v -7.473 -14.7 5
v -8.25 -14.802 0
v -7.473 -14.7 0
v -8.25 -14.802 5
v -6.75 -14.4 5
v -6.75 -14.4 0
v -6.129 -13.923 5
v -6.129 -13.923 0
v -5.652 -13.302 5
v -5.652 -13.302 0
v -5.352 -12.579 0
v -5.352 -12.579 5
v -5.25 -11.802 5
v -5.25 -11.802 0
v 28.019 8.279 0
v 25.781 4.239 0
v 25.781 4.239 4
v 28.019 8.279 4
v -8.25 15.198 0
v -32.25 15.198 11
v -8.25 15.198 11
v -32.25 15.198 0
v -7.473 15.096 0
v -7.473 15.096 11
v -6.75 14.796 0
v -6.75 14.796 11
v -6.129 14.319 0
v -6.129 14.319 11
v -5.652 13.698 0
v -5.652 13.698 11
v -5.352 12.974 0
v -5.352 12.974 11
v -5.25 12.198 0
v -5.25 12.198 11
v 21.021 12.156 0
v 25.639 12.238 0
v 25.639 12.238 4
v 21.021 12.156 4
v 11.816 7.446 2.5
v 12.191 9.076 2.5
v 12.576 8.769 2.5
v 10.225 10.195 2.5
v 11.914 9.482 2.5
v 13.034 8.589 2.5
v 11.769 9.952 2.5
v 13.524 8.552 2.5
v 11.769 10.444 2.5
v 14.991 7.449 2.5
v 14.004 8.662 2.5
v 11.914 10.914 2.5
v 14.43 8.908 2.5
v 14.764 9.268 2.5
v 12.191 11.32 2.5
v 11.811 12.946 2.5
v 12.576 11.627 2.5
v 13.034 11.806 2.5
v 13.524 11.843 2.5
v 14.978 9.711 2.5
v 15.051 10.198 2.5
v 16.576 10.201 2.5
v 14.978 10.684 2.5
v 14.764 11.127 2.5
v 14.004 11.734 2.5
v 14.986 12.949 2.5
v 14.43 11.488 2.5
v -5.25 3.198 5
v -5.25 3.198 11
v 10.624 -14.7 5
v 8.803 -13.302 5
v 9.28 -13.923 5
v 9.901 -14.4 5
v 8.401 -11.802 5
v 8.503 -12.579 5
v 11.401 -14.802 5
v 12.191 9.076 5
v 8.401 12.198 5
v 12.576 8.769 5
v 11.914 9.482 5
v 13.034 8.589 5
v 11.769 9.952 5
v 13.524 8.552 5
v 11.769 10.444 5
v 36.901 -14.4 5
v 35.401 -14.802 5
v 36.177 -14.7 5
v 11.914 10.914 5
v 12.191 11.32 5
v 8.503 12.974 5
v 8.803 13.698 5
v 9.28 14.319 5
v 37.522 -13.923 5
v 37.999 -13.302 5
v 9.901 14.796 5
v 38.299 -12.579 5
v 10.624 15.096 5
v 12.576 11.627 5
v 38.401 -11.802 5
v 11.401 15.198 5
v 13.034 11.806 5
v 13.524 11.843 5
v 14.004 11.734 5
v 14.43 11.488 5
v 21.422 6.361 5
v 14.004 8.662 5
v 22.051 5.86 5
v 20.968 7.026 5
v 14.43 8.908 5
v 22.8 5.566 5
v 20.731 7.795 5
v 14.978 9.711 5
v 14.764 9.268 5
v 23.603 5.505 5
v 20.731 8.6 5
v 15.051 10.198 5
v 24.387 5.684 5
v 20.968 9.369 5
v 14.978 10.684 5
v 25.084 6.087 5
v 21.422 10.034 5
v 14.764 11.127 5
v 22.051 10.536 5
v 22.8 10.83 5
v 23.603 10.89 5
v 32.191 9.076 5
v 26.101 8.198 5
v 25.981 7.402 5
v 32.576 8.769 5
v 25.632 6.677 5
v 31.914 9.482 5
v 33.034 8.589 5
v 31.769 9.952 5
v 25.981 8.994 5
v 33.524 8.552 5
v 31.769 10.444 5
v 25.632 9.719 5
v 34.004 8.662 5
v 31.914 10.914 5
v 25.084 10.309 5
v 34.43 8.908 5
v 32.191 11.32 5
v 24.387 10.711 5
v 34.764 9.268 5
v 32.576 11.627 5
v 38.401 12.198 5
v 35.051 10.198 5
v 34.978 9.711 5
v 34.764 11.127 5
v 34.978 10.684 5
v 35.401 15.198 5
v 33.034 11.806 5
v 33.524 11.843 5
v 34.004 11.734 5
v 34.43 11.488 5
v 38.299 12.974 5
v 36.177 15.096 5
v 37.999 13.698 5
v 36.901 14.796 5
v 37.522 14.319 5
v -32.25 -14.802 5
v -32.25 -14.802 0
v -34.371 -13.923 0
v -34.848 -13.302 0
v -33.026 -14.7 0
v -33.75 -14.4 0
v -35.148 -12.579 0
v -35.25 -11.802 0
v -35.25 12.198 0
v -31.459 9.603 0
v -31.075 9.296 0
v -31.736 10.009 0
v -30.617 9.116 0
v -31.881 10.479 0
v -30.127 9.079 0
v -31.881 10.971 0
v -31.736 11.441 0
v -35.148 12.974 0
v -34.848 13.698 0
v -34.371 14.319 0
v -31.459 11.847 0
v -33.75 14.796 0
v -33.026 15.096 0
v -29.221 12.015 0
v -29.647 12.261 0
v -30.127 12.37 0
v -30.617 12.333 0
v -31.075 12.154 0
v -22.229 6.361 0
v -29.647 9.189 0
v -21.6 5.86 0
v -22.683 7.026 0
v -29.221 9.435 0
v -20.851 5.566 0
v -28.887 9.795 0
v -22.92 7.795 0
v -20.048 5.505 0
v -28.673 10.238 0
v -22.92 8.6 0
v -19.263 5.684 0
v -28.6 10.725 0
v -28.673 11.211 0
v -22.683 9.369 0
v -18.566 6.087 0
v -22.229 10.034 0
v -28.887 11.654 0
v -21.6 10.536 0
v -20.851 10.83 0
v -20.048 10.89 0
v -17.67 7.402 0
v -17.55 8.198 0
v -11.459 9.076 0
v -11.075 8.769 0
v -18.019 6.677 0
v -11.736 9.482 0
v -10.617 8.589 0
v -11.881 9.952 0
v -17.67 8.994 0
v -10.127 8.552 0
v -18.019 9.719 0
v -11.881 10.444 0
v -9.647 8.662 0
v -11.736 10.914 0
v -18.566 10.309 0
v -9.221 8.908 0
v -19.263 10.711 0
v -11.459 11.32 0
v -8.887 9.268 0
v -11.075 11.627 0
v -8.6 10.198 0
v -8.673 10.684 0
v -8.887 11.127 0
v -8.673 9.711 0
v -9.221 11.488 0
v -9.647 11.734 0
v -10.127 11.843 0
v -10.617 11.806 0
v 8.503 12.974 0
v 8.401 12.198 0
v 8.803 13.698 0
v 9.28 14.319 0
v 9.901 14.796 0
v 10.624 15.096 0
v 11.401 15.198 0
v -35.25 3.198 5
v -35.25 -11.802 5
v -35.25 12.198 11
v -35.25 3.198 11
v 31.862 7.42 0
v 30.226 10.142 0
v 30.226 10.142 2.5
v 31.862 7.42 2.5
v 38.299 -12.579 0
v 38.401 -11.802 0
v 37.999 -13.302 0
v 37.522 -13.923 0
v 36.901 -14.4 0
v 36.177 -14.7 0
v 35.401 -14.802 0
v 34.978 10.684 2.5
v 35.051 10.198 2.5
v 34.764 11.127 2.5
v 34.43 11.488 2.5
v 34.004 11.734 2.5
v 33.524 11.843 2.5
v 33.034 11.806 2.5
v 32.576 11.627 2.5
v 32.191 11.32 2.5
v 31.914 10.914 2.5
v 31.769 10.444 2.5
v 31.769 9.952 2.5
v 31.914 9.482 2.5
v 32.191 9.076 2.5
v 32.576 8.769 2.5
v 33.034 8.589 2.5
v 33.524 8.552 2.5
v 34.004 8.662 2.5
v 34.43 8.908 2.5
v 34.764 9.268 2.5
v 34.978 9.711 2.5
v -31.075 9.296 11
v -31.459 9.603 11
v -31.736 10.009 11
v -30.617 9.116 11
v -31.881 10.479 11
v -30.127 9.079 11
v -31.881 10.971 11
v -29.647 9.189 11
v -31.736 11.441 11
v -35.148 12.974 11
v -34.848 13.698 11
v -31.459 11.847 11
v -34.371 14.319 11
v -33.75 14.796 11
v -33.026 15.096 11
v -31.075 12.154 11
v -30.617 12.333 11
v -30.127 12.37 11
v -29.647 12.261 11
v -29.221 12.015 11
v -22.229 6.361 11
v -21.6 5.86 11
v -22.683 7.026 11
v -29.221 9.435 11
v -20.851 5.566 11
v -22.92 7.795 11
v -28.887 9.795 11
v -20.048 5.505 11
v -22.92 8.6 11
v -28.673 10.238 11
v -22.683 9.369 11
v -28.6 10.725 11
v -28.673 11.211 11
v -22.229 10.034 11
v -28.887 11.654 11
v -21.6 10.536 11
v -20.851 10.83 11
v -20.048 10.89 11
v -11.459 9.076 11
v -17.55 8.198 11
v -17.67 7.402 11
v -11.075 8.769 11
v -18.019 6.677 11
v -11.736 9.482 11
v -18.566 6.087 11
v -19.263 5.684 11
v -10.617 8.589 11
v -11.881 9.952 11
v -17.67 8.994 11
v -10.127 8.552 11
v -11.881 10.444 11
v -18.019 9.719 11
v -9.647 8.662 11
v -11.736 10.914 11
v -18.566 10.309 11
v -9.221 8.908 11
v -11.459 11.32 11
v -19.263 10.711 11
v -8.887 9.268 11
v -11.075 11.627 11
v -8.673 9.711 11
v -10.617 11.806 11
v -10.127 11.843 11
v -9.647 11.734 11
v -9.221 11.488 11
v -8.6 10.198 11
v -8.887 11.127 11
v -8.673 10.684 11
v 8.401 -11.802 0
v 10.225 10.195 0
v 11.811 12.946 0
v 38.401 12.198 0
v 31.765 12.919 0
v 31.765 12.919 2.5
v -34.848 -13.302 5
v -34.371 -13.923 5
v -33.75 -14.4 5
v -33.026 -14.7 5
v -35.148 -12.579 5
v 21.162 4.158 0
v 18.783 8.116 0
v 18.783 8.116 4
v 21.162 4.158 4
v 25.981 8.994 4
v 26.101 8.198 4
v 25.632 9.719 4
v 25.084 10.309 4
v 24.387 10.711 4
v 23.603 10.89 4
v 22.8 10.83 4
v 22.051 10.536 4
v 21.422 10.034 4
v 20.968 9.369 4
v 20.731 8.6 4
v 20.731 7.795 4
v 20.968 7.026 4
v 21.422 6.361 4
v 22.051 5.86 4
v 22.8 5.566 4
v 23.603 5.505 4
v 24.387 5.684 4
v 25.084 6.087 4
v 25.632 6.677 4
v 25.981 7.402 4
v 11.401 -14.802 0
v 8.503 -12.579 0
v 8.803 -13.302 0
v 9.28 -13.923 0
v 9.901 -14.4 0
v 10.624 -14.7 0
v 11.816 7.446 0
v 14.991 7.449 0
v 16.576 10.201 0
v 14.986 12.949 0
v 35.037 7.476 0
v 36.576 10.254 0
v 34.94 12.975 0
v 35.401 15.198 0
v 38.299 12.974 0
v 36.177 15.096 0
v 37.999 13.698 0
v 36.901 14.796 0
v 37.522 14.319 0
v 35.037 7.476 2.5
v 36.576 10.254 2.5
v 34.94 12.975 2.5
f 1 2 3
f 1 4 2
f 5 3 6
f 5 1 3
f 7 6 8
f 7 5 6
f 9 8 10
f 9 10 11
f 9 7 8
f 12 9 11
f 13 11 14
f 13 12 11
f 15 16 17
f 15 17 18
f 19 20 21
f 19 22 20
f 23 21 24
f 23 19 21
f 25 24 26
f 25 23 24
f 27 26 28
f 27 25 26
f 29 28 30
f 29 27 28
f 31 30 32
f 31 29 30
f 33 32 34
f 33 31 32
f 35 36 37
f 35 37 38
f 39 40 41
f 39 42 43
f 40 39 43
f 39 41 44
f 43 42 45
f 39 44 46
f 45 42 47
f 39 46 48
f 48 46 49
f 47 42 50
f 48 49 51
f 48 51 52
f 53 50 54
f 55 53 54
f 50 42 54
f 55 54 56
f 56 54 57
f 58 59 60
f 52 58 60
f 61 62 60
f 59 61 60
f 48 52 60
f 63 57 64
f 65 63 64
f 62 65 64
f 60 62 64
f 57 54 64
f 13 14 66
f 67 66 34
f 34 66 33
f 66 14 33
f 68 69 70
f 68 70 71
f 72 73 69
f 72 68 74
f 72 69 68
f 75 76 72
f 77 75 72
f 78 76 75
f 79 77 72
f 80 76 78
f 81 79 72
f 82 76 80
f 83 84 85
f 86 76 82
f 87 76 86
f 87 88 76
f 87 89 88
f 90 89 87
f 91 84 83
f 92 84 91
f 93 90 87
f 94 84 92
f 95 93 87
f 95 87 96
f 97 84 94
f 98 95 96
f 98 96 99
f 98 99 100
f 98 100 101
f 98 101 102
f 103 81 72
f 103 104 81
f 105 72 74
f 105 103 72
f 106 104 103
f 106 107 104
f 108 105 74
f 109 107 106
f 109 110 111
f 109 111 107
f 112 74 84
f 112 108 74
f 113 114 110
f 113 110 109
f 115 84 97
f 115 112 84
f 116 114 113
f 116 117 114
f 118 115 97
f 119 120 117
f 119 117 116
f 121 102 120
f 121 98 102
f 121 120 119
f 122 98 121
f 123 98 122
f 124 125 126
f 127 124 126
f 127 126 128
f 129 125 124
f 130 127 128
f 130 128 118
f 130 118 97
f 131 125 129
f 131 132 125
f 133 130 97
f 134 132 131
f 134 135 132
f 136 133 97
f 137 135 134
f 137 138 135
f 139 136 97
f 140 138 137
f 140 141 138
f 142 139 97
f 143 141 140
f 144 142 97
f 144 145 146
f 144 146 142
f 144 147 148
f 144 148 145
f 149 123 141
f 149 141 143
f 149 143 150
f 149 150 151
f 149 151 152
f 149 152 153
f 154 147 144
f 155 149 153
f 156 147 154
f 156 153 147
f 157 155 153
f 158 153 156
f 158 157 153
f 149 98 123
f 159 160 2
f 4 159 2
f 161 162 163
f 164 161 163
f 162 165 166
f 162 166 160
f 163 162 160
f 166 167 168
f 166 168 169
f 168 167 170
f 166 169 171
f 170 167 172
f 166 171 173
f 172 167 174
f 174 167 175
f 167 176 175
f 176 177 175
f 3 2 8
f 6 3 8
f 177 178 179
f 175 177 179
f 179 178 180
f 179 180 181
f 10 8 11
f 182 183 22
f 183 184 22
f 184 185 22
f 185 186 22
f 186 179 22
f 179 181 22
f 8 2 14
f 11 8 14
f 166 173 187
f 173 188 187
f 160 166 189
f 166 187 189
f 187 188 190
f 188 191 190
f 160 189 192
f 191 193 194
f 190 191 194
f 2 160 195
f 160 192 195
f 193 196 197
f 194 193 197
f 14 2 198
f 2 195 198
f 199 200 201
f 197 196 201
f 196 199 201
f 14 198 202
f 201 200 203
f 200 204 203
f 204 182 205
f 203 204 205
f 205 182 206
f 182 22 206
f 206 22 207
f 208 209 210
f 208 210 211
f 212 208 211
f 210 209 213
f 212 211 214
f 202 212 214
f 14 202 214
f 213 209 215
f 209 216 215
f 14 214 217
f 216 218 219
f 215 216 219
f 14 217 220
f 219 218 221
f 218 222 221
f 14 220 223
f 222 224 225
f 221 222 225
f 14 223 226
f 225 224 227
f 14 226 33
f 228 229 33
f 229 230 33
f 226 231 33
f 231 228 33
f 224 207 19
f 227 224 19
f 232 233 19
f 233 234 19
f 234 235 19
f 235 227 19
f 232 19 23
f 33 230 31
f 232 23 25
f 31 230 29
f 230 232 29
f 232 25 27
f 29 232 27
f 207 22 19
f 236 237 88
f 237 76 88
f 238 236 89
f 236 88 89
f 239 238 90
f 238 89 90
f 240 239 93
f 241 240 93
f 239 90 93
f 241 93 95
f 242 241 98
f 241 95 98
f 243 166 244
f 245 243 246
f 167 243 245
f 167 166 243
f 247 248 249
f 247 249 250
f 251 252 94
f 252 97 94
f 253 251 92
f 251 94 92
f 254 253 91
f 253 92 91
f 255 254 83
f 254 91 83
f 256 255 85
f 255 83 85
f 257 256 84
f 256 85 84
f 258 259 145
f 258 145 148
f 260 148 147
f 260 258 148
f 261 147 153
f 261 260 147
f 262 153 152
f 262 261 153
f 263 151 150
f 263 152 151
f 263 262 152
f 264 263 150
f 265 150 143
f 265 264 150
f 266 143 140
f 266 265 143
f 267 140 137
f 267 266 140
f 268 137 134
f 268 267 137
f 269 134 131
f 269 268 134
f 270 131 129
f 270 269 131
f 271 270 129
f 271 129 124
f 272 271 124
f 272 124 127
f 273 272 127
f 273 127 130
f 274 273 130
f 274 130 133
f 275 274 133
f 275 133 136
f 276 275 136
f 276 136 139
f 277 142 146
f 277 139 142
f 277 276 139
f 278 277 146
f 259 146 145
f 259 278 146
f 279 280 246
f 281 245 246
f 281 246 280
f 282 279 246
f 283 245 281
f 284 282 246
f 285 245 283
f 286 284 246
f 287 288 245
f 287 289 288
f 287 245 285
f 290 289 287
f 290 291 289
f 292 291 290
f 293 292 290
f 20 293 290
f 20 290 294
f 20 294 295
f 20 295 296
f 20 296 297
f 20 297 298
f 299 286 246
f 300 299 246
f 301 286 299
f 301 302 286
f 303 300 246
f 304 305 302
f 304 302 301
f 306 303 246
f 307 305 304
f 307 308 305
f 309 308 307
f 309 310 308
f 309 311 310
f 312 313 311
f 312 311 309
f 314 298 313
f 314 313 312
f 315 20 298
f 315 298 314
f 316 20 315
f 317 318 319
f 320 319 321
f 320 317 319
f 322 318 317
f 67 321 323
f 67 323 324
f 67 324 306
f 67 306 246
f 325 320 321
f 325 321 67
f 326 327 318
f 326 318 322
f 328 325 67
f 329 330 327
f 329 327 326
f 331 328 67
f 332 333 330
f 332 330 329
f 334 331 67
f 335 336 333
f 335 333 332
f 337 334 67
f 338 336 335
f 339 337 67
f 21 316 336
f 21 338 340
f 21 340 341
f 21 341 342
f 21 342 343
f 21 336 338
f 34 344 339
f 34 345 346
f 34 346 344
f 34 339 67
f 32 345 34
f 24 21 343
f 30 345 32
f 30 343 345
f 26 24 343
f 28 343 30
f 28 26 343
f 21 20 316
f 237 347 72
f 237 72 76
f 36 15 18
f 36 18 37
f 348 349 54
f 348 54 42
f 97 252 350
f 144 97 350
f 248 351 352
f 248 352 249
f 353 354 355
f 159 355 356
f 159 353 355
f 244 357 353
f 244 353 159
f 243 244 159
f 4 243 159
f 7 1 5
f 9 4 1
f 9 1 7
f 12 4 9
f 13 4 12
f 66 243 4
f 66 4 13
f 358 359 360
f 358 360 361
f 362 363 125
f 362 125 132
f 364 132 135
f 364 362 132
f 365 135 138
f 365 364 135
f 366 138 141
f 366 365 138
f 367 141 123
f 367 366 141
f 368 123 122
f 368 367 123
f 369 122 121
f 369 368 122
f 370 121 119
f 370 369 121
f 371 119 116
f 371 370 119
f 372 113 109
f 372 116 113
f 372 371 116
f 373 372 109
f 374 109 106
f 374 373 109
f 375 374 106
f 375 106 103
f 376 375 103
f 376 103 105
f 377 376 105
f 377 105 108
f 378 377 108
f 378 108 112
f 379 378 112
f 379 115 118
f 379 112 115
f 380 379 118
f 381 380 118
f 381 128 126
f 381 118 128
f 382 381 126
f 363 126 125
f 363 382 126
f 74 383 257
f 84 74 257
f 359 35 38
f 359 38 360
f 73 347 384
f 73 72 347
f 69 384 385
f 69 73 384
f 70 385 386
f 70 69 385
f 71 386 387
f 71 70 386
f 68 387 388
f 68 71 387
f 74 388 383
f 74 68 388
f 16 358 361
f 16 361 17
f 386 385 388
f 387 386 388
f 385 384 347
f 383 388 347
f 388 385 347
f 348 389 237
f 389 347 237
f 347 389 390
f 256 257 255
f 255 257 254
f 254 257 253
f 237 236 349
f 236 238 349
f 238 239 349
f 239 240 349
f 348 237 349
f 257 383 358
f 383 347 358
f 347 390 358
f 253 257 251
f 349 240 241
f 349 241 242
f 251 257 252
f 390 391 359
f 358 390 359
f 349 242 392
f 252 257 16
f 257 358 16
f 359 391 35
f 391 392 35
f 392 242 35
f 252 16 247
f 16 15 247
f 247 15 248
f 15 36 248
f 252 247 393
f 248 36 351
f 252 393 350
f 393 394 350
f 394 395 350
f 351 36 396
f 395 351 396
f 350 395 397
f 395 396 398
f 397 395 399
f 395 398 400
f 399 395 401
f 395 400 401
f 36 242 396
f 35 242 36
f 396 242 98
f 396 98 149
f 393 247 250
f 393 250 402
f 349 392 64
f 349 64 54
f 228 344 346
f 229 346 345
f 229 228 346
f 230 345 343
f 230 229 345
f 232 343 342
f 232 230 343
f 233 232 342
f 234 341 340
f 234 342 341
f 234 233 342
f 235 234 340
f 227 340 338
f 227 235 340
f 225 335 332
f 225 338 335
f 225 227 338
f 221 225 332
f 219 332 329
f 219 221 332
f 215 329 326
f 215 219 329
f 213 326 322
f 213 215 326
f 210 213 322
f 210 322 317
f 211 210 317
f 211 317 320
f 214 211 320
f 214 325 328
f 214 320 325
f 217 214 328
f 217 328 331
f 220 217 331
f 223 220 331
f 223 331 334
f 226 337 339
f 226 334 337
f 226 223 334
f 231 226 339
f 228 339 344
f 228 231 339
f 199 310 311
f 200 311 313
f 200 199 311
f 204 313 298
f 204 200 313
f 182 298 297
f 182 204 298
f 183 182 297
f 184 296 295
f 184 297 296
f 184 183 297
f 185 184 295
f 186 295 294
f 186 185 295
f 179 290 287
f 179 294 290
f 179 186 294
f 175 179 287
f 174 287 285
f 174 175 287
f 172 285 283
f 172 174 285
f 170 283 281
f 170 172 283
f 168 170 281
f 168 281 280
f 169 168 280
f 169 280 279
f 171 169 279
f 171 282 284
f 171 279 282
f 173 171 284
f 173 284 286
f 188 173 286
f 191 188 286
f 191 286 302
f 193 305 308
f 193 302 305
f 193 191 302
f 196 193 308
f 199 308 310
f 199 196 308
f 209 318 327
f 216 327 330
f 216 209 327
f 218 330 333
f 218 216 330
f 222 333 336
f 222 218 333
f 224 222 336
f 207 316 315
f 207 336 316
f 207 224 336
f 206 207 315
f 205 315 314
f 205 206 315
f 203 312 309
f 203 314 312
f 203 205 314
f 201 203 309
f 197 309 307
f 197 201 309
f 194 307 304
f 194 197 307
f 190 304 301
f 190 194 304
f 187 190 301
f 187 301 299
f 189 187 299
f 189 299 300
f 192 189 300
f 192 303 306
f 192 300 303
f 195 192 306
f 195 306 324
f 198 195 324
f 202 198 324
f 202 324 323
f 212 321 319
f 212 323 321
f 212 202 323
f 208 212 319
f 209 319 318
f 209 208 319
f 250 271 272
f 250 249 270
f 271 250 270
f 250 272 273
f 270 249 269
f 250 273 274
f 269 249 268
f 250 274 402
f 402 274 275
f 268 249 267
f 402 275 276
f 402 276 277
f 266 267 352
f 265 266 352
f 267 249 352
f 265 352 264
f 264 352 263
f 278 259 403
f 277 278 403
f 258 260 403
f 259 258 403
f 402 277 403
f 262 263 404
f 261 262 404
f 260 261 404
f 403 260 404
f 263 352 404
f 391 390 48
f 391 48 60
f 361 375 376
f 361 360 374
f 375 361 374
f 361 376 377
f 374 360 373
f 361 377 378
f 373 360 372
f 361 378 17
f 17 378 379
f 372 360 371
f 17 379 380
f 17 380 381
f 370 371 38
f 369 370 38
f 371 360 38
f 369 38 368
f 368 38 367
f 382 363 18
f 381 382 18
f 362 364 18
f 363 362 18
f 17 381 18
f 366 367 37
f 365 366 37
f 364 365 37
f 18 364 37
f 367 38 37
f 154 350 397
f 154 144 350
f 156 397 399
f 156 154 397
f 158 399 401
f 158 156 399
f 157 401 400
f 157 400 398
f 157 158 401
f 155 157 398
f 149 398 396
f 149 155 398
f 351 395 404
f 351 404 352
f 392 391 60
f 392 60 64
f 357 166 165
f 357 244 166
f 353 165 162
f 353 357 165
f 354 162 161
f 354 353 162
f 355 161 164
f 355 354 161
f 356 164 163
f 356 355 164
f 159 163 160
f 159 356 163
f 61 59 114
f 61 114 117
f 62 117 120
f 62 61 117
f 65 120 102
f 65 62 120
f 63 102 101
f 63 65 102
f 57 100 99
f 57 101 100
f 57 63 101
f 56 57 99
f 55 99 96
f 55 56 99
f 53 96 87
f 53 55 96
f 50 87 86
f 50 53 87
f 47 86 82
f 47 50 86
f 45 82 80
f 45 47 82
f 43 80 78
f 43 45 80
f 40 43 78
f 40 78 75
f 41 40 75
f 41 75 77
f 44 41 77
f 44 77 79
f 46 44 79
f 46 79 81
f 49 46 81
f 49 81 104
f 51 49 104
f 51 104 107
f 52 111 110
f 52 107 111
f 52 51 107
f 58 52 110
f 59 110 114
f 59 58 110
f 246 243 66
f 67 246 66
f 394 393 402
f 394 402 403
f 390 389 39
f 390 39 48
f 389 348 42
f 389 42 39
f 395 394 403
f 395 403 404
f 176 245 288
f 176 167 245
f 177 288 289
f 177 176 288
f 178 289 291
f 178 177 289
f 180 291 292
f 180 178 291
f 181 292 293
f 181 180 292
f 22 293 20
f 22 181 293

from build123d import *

# Parameters (mm, degrees)
F0_W     = 30
F0_H     = 30
F1_DEPTH = 5
F2_W     = 30
F2_H     = 12
F3_DEPTH = 6
F4_R     = 1.65
F4_R_2   = 2.7
F5_DEPTH = 11.001
F7_DEPTH = 2.5
F8_DEPTH = 1.5
F9_R     = 3
F9_2_R   = 3


with BuildPart() as f1:
    # F0 (on Top) → F1 (new body)
    with BuildSketch(Plane.XY):
        with Locations((-20.2498977029, 0.1978335731)):
            Rectangle(F0_W, F0_H)
    extrude(amount=F1_DEPTH)

    # F2 (on face) → F3 (join)
    with BuildSketch(Plane.XY.offset(5)):
        with Locations((-20.2498977029, 9.1978335731)):
            Rectangle(F2_W, F2_H)
    extrude(amount=F3_DEPTH)


with BuildPart() as f1b:
    # F0 (on Top) → F1, piece 2 (new body)
    with BuildSketch(Plane.XY):
        with Locations((23.4008972489, 0.1978335731)):
            Rectangle(F0_W, F0_H)
    extrude(amount=F1_DEPTH)


with BuildPart() as f5_tool:
    # F4 (on Top) → F5 (new body, through all)
    with BuildSketch(Plane.XY):
        with Locations((33.4008972489, 10.1978335731)):
            Circle(F4_R)
        with Locations((23.4008972489, 8.1978335731)):
            Circle(F4_R_2)
        with Locations((13.4008972489, 10.1978335731)):
            Circle(F4_R)
        with Locations((-10.2498977029, 10.1978335731)):
            Circle(F4_R)
        with Locations((-20.2498977029, 8.1978335731)):
            Circle(F4_R_2)
        with Locations((-30.2498977029, 10.7247970566)):
            Circle(F4_R)
    extrude(amount=F5_DEPTH)


with BuildPart() as f1_1:
    add(f1.part)

    # F5: cut by f5_tool
    add(f5_tool.part, mode=Mode.SUBTRACT)

    # F9#2
    f9_2_edges = [f1_1.edges().sort_by_distance(p)[0] for p in [
        (-5.249898, -14.802166, 2.5),
        (-35.249898, -14.802166, 2.5),
        (-35.249898, 15.197834, 5.5),
        (-5.249898, 15.197834, 5.5),
    ]]
    fillet(f9_2_edges, radius=F9_2_R)


with BuildPart() as f1b_1:
    add(f1b.part)

    # F5: cut by f5_tool
    add(f5_tool.part, mode=Mode.SUBTRACT)

    # F6 (on Top) → F7 (cut)
    with BuildSketch(Plane.XY):
        Polygon((14.9912161835, 7.4493396183), (16.5763223032, 10.2008431932), (14.9860033686, 12.949337148), (11.8105783143, 12.9463275279), (10.2254721946, 10.194823953), (11.8157911292, 7.4463299982), align=None)
        Polygon((25.78052926, 4.2392119916), (28.018980108, 8.2793445556), (25.6393480969, 12.2379661371), (21.0212652379, 12.1564551545), (18.7828143899, 8.1163225906), (21.162446401, 4.1577010091), align=None)
        Polygon((35.0368942565, 7.4762812358), (36.5758292145, 10.2538723736), (34.9398322069, 12.9754247108), (31.7649002413, 12.9193859103), (30.2259652833, 10.1417947726), (31.8619622909, 7.4202424353), align=None)
    extrude(amount=F7_DEPTH, mode=Mode.SUBTRACT)

    # F8 (cut): a face of the model
    f8_faces = [f1b_1.faces().sort_by_distance(p)[0] for p in [
        (23.4693221441, 4.3211555386, 2.5),
    ]]
    extrude(f8_faces, amount=-F8_DEPTH, mode=Mode.SUBTRACT)

    # F9
    f9_edges = [f1b_1.edges().sort_by_distance(p)[0] for p in [
        (38.400897, -14.802166, 2.5),
        (38.400897, 15.197834, 2.5),
        (8.400897, -14.802166, 2.5),
        (8.400897, 15.197834, 2.5),
    ]]
    fillet(f9_edges, radius=F9_R)


solid = Compound([f1_1.part, f1b_1.part])
